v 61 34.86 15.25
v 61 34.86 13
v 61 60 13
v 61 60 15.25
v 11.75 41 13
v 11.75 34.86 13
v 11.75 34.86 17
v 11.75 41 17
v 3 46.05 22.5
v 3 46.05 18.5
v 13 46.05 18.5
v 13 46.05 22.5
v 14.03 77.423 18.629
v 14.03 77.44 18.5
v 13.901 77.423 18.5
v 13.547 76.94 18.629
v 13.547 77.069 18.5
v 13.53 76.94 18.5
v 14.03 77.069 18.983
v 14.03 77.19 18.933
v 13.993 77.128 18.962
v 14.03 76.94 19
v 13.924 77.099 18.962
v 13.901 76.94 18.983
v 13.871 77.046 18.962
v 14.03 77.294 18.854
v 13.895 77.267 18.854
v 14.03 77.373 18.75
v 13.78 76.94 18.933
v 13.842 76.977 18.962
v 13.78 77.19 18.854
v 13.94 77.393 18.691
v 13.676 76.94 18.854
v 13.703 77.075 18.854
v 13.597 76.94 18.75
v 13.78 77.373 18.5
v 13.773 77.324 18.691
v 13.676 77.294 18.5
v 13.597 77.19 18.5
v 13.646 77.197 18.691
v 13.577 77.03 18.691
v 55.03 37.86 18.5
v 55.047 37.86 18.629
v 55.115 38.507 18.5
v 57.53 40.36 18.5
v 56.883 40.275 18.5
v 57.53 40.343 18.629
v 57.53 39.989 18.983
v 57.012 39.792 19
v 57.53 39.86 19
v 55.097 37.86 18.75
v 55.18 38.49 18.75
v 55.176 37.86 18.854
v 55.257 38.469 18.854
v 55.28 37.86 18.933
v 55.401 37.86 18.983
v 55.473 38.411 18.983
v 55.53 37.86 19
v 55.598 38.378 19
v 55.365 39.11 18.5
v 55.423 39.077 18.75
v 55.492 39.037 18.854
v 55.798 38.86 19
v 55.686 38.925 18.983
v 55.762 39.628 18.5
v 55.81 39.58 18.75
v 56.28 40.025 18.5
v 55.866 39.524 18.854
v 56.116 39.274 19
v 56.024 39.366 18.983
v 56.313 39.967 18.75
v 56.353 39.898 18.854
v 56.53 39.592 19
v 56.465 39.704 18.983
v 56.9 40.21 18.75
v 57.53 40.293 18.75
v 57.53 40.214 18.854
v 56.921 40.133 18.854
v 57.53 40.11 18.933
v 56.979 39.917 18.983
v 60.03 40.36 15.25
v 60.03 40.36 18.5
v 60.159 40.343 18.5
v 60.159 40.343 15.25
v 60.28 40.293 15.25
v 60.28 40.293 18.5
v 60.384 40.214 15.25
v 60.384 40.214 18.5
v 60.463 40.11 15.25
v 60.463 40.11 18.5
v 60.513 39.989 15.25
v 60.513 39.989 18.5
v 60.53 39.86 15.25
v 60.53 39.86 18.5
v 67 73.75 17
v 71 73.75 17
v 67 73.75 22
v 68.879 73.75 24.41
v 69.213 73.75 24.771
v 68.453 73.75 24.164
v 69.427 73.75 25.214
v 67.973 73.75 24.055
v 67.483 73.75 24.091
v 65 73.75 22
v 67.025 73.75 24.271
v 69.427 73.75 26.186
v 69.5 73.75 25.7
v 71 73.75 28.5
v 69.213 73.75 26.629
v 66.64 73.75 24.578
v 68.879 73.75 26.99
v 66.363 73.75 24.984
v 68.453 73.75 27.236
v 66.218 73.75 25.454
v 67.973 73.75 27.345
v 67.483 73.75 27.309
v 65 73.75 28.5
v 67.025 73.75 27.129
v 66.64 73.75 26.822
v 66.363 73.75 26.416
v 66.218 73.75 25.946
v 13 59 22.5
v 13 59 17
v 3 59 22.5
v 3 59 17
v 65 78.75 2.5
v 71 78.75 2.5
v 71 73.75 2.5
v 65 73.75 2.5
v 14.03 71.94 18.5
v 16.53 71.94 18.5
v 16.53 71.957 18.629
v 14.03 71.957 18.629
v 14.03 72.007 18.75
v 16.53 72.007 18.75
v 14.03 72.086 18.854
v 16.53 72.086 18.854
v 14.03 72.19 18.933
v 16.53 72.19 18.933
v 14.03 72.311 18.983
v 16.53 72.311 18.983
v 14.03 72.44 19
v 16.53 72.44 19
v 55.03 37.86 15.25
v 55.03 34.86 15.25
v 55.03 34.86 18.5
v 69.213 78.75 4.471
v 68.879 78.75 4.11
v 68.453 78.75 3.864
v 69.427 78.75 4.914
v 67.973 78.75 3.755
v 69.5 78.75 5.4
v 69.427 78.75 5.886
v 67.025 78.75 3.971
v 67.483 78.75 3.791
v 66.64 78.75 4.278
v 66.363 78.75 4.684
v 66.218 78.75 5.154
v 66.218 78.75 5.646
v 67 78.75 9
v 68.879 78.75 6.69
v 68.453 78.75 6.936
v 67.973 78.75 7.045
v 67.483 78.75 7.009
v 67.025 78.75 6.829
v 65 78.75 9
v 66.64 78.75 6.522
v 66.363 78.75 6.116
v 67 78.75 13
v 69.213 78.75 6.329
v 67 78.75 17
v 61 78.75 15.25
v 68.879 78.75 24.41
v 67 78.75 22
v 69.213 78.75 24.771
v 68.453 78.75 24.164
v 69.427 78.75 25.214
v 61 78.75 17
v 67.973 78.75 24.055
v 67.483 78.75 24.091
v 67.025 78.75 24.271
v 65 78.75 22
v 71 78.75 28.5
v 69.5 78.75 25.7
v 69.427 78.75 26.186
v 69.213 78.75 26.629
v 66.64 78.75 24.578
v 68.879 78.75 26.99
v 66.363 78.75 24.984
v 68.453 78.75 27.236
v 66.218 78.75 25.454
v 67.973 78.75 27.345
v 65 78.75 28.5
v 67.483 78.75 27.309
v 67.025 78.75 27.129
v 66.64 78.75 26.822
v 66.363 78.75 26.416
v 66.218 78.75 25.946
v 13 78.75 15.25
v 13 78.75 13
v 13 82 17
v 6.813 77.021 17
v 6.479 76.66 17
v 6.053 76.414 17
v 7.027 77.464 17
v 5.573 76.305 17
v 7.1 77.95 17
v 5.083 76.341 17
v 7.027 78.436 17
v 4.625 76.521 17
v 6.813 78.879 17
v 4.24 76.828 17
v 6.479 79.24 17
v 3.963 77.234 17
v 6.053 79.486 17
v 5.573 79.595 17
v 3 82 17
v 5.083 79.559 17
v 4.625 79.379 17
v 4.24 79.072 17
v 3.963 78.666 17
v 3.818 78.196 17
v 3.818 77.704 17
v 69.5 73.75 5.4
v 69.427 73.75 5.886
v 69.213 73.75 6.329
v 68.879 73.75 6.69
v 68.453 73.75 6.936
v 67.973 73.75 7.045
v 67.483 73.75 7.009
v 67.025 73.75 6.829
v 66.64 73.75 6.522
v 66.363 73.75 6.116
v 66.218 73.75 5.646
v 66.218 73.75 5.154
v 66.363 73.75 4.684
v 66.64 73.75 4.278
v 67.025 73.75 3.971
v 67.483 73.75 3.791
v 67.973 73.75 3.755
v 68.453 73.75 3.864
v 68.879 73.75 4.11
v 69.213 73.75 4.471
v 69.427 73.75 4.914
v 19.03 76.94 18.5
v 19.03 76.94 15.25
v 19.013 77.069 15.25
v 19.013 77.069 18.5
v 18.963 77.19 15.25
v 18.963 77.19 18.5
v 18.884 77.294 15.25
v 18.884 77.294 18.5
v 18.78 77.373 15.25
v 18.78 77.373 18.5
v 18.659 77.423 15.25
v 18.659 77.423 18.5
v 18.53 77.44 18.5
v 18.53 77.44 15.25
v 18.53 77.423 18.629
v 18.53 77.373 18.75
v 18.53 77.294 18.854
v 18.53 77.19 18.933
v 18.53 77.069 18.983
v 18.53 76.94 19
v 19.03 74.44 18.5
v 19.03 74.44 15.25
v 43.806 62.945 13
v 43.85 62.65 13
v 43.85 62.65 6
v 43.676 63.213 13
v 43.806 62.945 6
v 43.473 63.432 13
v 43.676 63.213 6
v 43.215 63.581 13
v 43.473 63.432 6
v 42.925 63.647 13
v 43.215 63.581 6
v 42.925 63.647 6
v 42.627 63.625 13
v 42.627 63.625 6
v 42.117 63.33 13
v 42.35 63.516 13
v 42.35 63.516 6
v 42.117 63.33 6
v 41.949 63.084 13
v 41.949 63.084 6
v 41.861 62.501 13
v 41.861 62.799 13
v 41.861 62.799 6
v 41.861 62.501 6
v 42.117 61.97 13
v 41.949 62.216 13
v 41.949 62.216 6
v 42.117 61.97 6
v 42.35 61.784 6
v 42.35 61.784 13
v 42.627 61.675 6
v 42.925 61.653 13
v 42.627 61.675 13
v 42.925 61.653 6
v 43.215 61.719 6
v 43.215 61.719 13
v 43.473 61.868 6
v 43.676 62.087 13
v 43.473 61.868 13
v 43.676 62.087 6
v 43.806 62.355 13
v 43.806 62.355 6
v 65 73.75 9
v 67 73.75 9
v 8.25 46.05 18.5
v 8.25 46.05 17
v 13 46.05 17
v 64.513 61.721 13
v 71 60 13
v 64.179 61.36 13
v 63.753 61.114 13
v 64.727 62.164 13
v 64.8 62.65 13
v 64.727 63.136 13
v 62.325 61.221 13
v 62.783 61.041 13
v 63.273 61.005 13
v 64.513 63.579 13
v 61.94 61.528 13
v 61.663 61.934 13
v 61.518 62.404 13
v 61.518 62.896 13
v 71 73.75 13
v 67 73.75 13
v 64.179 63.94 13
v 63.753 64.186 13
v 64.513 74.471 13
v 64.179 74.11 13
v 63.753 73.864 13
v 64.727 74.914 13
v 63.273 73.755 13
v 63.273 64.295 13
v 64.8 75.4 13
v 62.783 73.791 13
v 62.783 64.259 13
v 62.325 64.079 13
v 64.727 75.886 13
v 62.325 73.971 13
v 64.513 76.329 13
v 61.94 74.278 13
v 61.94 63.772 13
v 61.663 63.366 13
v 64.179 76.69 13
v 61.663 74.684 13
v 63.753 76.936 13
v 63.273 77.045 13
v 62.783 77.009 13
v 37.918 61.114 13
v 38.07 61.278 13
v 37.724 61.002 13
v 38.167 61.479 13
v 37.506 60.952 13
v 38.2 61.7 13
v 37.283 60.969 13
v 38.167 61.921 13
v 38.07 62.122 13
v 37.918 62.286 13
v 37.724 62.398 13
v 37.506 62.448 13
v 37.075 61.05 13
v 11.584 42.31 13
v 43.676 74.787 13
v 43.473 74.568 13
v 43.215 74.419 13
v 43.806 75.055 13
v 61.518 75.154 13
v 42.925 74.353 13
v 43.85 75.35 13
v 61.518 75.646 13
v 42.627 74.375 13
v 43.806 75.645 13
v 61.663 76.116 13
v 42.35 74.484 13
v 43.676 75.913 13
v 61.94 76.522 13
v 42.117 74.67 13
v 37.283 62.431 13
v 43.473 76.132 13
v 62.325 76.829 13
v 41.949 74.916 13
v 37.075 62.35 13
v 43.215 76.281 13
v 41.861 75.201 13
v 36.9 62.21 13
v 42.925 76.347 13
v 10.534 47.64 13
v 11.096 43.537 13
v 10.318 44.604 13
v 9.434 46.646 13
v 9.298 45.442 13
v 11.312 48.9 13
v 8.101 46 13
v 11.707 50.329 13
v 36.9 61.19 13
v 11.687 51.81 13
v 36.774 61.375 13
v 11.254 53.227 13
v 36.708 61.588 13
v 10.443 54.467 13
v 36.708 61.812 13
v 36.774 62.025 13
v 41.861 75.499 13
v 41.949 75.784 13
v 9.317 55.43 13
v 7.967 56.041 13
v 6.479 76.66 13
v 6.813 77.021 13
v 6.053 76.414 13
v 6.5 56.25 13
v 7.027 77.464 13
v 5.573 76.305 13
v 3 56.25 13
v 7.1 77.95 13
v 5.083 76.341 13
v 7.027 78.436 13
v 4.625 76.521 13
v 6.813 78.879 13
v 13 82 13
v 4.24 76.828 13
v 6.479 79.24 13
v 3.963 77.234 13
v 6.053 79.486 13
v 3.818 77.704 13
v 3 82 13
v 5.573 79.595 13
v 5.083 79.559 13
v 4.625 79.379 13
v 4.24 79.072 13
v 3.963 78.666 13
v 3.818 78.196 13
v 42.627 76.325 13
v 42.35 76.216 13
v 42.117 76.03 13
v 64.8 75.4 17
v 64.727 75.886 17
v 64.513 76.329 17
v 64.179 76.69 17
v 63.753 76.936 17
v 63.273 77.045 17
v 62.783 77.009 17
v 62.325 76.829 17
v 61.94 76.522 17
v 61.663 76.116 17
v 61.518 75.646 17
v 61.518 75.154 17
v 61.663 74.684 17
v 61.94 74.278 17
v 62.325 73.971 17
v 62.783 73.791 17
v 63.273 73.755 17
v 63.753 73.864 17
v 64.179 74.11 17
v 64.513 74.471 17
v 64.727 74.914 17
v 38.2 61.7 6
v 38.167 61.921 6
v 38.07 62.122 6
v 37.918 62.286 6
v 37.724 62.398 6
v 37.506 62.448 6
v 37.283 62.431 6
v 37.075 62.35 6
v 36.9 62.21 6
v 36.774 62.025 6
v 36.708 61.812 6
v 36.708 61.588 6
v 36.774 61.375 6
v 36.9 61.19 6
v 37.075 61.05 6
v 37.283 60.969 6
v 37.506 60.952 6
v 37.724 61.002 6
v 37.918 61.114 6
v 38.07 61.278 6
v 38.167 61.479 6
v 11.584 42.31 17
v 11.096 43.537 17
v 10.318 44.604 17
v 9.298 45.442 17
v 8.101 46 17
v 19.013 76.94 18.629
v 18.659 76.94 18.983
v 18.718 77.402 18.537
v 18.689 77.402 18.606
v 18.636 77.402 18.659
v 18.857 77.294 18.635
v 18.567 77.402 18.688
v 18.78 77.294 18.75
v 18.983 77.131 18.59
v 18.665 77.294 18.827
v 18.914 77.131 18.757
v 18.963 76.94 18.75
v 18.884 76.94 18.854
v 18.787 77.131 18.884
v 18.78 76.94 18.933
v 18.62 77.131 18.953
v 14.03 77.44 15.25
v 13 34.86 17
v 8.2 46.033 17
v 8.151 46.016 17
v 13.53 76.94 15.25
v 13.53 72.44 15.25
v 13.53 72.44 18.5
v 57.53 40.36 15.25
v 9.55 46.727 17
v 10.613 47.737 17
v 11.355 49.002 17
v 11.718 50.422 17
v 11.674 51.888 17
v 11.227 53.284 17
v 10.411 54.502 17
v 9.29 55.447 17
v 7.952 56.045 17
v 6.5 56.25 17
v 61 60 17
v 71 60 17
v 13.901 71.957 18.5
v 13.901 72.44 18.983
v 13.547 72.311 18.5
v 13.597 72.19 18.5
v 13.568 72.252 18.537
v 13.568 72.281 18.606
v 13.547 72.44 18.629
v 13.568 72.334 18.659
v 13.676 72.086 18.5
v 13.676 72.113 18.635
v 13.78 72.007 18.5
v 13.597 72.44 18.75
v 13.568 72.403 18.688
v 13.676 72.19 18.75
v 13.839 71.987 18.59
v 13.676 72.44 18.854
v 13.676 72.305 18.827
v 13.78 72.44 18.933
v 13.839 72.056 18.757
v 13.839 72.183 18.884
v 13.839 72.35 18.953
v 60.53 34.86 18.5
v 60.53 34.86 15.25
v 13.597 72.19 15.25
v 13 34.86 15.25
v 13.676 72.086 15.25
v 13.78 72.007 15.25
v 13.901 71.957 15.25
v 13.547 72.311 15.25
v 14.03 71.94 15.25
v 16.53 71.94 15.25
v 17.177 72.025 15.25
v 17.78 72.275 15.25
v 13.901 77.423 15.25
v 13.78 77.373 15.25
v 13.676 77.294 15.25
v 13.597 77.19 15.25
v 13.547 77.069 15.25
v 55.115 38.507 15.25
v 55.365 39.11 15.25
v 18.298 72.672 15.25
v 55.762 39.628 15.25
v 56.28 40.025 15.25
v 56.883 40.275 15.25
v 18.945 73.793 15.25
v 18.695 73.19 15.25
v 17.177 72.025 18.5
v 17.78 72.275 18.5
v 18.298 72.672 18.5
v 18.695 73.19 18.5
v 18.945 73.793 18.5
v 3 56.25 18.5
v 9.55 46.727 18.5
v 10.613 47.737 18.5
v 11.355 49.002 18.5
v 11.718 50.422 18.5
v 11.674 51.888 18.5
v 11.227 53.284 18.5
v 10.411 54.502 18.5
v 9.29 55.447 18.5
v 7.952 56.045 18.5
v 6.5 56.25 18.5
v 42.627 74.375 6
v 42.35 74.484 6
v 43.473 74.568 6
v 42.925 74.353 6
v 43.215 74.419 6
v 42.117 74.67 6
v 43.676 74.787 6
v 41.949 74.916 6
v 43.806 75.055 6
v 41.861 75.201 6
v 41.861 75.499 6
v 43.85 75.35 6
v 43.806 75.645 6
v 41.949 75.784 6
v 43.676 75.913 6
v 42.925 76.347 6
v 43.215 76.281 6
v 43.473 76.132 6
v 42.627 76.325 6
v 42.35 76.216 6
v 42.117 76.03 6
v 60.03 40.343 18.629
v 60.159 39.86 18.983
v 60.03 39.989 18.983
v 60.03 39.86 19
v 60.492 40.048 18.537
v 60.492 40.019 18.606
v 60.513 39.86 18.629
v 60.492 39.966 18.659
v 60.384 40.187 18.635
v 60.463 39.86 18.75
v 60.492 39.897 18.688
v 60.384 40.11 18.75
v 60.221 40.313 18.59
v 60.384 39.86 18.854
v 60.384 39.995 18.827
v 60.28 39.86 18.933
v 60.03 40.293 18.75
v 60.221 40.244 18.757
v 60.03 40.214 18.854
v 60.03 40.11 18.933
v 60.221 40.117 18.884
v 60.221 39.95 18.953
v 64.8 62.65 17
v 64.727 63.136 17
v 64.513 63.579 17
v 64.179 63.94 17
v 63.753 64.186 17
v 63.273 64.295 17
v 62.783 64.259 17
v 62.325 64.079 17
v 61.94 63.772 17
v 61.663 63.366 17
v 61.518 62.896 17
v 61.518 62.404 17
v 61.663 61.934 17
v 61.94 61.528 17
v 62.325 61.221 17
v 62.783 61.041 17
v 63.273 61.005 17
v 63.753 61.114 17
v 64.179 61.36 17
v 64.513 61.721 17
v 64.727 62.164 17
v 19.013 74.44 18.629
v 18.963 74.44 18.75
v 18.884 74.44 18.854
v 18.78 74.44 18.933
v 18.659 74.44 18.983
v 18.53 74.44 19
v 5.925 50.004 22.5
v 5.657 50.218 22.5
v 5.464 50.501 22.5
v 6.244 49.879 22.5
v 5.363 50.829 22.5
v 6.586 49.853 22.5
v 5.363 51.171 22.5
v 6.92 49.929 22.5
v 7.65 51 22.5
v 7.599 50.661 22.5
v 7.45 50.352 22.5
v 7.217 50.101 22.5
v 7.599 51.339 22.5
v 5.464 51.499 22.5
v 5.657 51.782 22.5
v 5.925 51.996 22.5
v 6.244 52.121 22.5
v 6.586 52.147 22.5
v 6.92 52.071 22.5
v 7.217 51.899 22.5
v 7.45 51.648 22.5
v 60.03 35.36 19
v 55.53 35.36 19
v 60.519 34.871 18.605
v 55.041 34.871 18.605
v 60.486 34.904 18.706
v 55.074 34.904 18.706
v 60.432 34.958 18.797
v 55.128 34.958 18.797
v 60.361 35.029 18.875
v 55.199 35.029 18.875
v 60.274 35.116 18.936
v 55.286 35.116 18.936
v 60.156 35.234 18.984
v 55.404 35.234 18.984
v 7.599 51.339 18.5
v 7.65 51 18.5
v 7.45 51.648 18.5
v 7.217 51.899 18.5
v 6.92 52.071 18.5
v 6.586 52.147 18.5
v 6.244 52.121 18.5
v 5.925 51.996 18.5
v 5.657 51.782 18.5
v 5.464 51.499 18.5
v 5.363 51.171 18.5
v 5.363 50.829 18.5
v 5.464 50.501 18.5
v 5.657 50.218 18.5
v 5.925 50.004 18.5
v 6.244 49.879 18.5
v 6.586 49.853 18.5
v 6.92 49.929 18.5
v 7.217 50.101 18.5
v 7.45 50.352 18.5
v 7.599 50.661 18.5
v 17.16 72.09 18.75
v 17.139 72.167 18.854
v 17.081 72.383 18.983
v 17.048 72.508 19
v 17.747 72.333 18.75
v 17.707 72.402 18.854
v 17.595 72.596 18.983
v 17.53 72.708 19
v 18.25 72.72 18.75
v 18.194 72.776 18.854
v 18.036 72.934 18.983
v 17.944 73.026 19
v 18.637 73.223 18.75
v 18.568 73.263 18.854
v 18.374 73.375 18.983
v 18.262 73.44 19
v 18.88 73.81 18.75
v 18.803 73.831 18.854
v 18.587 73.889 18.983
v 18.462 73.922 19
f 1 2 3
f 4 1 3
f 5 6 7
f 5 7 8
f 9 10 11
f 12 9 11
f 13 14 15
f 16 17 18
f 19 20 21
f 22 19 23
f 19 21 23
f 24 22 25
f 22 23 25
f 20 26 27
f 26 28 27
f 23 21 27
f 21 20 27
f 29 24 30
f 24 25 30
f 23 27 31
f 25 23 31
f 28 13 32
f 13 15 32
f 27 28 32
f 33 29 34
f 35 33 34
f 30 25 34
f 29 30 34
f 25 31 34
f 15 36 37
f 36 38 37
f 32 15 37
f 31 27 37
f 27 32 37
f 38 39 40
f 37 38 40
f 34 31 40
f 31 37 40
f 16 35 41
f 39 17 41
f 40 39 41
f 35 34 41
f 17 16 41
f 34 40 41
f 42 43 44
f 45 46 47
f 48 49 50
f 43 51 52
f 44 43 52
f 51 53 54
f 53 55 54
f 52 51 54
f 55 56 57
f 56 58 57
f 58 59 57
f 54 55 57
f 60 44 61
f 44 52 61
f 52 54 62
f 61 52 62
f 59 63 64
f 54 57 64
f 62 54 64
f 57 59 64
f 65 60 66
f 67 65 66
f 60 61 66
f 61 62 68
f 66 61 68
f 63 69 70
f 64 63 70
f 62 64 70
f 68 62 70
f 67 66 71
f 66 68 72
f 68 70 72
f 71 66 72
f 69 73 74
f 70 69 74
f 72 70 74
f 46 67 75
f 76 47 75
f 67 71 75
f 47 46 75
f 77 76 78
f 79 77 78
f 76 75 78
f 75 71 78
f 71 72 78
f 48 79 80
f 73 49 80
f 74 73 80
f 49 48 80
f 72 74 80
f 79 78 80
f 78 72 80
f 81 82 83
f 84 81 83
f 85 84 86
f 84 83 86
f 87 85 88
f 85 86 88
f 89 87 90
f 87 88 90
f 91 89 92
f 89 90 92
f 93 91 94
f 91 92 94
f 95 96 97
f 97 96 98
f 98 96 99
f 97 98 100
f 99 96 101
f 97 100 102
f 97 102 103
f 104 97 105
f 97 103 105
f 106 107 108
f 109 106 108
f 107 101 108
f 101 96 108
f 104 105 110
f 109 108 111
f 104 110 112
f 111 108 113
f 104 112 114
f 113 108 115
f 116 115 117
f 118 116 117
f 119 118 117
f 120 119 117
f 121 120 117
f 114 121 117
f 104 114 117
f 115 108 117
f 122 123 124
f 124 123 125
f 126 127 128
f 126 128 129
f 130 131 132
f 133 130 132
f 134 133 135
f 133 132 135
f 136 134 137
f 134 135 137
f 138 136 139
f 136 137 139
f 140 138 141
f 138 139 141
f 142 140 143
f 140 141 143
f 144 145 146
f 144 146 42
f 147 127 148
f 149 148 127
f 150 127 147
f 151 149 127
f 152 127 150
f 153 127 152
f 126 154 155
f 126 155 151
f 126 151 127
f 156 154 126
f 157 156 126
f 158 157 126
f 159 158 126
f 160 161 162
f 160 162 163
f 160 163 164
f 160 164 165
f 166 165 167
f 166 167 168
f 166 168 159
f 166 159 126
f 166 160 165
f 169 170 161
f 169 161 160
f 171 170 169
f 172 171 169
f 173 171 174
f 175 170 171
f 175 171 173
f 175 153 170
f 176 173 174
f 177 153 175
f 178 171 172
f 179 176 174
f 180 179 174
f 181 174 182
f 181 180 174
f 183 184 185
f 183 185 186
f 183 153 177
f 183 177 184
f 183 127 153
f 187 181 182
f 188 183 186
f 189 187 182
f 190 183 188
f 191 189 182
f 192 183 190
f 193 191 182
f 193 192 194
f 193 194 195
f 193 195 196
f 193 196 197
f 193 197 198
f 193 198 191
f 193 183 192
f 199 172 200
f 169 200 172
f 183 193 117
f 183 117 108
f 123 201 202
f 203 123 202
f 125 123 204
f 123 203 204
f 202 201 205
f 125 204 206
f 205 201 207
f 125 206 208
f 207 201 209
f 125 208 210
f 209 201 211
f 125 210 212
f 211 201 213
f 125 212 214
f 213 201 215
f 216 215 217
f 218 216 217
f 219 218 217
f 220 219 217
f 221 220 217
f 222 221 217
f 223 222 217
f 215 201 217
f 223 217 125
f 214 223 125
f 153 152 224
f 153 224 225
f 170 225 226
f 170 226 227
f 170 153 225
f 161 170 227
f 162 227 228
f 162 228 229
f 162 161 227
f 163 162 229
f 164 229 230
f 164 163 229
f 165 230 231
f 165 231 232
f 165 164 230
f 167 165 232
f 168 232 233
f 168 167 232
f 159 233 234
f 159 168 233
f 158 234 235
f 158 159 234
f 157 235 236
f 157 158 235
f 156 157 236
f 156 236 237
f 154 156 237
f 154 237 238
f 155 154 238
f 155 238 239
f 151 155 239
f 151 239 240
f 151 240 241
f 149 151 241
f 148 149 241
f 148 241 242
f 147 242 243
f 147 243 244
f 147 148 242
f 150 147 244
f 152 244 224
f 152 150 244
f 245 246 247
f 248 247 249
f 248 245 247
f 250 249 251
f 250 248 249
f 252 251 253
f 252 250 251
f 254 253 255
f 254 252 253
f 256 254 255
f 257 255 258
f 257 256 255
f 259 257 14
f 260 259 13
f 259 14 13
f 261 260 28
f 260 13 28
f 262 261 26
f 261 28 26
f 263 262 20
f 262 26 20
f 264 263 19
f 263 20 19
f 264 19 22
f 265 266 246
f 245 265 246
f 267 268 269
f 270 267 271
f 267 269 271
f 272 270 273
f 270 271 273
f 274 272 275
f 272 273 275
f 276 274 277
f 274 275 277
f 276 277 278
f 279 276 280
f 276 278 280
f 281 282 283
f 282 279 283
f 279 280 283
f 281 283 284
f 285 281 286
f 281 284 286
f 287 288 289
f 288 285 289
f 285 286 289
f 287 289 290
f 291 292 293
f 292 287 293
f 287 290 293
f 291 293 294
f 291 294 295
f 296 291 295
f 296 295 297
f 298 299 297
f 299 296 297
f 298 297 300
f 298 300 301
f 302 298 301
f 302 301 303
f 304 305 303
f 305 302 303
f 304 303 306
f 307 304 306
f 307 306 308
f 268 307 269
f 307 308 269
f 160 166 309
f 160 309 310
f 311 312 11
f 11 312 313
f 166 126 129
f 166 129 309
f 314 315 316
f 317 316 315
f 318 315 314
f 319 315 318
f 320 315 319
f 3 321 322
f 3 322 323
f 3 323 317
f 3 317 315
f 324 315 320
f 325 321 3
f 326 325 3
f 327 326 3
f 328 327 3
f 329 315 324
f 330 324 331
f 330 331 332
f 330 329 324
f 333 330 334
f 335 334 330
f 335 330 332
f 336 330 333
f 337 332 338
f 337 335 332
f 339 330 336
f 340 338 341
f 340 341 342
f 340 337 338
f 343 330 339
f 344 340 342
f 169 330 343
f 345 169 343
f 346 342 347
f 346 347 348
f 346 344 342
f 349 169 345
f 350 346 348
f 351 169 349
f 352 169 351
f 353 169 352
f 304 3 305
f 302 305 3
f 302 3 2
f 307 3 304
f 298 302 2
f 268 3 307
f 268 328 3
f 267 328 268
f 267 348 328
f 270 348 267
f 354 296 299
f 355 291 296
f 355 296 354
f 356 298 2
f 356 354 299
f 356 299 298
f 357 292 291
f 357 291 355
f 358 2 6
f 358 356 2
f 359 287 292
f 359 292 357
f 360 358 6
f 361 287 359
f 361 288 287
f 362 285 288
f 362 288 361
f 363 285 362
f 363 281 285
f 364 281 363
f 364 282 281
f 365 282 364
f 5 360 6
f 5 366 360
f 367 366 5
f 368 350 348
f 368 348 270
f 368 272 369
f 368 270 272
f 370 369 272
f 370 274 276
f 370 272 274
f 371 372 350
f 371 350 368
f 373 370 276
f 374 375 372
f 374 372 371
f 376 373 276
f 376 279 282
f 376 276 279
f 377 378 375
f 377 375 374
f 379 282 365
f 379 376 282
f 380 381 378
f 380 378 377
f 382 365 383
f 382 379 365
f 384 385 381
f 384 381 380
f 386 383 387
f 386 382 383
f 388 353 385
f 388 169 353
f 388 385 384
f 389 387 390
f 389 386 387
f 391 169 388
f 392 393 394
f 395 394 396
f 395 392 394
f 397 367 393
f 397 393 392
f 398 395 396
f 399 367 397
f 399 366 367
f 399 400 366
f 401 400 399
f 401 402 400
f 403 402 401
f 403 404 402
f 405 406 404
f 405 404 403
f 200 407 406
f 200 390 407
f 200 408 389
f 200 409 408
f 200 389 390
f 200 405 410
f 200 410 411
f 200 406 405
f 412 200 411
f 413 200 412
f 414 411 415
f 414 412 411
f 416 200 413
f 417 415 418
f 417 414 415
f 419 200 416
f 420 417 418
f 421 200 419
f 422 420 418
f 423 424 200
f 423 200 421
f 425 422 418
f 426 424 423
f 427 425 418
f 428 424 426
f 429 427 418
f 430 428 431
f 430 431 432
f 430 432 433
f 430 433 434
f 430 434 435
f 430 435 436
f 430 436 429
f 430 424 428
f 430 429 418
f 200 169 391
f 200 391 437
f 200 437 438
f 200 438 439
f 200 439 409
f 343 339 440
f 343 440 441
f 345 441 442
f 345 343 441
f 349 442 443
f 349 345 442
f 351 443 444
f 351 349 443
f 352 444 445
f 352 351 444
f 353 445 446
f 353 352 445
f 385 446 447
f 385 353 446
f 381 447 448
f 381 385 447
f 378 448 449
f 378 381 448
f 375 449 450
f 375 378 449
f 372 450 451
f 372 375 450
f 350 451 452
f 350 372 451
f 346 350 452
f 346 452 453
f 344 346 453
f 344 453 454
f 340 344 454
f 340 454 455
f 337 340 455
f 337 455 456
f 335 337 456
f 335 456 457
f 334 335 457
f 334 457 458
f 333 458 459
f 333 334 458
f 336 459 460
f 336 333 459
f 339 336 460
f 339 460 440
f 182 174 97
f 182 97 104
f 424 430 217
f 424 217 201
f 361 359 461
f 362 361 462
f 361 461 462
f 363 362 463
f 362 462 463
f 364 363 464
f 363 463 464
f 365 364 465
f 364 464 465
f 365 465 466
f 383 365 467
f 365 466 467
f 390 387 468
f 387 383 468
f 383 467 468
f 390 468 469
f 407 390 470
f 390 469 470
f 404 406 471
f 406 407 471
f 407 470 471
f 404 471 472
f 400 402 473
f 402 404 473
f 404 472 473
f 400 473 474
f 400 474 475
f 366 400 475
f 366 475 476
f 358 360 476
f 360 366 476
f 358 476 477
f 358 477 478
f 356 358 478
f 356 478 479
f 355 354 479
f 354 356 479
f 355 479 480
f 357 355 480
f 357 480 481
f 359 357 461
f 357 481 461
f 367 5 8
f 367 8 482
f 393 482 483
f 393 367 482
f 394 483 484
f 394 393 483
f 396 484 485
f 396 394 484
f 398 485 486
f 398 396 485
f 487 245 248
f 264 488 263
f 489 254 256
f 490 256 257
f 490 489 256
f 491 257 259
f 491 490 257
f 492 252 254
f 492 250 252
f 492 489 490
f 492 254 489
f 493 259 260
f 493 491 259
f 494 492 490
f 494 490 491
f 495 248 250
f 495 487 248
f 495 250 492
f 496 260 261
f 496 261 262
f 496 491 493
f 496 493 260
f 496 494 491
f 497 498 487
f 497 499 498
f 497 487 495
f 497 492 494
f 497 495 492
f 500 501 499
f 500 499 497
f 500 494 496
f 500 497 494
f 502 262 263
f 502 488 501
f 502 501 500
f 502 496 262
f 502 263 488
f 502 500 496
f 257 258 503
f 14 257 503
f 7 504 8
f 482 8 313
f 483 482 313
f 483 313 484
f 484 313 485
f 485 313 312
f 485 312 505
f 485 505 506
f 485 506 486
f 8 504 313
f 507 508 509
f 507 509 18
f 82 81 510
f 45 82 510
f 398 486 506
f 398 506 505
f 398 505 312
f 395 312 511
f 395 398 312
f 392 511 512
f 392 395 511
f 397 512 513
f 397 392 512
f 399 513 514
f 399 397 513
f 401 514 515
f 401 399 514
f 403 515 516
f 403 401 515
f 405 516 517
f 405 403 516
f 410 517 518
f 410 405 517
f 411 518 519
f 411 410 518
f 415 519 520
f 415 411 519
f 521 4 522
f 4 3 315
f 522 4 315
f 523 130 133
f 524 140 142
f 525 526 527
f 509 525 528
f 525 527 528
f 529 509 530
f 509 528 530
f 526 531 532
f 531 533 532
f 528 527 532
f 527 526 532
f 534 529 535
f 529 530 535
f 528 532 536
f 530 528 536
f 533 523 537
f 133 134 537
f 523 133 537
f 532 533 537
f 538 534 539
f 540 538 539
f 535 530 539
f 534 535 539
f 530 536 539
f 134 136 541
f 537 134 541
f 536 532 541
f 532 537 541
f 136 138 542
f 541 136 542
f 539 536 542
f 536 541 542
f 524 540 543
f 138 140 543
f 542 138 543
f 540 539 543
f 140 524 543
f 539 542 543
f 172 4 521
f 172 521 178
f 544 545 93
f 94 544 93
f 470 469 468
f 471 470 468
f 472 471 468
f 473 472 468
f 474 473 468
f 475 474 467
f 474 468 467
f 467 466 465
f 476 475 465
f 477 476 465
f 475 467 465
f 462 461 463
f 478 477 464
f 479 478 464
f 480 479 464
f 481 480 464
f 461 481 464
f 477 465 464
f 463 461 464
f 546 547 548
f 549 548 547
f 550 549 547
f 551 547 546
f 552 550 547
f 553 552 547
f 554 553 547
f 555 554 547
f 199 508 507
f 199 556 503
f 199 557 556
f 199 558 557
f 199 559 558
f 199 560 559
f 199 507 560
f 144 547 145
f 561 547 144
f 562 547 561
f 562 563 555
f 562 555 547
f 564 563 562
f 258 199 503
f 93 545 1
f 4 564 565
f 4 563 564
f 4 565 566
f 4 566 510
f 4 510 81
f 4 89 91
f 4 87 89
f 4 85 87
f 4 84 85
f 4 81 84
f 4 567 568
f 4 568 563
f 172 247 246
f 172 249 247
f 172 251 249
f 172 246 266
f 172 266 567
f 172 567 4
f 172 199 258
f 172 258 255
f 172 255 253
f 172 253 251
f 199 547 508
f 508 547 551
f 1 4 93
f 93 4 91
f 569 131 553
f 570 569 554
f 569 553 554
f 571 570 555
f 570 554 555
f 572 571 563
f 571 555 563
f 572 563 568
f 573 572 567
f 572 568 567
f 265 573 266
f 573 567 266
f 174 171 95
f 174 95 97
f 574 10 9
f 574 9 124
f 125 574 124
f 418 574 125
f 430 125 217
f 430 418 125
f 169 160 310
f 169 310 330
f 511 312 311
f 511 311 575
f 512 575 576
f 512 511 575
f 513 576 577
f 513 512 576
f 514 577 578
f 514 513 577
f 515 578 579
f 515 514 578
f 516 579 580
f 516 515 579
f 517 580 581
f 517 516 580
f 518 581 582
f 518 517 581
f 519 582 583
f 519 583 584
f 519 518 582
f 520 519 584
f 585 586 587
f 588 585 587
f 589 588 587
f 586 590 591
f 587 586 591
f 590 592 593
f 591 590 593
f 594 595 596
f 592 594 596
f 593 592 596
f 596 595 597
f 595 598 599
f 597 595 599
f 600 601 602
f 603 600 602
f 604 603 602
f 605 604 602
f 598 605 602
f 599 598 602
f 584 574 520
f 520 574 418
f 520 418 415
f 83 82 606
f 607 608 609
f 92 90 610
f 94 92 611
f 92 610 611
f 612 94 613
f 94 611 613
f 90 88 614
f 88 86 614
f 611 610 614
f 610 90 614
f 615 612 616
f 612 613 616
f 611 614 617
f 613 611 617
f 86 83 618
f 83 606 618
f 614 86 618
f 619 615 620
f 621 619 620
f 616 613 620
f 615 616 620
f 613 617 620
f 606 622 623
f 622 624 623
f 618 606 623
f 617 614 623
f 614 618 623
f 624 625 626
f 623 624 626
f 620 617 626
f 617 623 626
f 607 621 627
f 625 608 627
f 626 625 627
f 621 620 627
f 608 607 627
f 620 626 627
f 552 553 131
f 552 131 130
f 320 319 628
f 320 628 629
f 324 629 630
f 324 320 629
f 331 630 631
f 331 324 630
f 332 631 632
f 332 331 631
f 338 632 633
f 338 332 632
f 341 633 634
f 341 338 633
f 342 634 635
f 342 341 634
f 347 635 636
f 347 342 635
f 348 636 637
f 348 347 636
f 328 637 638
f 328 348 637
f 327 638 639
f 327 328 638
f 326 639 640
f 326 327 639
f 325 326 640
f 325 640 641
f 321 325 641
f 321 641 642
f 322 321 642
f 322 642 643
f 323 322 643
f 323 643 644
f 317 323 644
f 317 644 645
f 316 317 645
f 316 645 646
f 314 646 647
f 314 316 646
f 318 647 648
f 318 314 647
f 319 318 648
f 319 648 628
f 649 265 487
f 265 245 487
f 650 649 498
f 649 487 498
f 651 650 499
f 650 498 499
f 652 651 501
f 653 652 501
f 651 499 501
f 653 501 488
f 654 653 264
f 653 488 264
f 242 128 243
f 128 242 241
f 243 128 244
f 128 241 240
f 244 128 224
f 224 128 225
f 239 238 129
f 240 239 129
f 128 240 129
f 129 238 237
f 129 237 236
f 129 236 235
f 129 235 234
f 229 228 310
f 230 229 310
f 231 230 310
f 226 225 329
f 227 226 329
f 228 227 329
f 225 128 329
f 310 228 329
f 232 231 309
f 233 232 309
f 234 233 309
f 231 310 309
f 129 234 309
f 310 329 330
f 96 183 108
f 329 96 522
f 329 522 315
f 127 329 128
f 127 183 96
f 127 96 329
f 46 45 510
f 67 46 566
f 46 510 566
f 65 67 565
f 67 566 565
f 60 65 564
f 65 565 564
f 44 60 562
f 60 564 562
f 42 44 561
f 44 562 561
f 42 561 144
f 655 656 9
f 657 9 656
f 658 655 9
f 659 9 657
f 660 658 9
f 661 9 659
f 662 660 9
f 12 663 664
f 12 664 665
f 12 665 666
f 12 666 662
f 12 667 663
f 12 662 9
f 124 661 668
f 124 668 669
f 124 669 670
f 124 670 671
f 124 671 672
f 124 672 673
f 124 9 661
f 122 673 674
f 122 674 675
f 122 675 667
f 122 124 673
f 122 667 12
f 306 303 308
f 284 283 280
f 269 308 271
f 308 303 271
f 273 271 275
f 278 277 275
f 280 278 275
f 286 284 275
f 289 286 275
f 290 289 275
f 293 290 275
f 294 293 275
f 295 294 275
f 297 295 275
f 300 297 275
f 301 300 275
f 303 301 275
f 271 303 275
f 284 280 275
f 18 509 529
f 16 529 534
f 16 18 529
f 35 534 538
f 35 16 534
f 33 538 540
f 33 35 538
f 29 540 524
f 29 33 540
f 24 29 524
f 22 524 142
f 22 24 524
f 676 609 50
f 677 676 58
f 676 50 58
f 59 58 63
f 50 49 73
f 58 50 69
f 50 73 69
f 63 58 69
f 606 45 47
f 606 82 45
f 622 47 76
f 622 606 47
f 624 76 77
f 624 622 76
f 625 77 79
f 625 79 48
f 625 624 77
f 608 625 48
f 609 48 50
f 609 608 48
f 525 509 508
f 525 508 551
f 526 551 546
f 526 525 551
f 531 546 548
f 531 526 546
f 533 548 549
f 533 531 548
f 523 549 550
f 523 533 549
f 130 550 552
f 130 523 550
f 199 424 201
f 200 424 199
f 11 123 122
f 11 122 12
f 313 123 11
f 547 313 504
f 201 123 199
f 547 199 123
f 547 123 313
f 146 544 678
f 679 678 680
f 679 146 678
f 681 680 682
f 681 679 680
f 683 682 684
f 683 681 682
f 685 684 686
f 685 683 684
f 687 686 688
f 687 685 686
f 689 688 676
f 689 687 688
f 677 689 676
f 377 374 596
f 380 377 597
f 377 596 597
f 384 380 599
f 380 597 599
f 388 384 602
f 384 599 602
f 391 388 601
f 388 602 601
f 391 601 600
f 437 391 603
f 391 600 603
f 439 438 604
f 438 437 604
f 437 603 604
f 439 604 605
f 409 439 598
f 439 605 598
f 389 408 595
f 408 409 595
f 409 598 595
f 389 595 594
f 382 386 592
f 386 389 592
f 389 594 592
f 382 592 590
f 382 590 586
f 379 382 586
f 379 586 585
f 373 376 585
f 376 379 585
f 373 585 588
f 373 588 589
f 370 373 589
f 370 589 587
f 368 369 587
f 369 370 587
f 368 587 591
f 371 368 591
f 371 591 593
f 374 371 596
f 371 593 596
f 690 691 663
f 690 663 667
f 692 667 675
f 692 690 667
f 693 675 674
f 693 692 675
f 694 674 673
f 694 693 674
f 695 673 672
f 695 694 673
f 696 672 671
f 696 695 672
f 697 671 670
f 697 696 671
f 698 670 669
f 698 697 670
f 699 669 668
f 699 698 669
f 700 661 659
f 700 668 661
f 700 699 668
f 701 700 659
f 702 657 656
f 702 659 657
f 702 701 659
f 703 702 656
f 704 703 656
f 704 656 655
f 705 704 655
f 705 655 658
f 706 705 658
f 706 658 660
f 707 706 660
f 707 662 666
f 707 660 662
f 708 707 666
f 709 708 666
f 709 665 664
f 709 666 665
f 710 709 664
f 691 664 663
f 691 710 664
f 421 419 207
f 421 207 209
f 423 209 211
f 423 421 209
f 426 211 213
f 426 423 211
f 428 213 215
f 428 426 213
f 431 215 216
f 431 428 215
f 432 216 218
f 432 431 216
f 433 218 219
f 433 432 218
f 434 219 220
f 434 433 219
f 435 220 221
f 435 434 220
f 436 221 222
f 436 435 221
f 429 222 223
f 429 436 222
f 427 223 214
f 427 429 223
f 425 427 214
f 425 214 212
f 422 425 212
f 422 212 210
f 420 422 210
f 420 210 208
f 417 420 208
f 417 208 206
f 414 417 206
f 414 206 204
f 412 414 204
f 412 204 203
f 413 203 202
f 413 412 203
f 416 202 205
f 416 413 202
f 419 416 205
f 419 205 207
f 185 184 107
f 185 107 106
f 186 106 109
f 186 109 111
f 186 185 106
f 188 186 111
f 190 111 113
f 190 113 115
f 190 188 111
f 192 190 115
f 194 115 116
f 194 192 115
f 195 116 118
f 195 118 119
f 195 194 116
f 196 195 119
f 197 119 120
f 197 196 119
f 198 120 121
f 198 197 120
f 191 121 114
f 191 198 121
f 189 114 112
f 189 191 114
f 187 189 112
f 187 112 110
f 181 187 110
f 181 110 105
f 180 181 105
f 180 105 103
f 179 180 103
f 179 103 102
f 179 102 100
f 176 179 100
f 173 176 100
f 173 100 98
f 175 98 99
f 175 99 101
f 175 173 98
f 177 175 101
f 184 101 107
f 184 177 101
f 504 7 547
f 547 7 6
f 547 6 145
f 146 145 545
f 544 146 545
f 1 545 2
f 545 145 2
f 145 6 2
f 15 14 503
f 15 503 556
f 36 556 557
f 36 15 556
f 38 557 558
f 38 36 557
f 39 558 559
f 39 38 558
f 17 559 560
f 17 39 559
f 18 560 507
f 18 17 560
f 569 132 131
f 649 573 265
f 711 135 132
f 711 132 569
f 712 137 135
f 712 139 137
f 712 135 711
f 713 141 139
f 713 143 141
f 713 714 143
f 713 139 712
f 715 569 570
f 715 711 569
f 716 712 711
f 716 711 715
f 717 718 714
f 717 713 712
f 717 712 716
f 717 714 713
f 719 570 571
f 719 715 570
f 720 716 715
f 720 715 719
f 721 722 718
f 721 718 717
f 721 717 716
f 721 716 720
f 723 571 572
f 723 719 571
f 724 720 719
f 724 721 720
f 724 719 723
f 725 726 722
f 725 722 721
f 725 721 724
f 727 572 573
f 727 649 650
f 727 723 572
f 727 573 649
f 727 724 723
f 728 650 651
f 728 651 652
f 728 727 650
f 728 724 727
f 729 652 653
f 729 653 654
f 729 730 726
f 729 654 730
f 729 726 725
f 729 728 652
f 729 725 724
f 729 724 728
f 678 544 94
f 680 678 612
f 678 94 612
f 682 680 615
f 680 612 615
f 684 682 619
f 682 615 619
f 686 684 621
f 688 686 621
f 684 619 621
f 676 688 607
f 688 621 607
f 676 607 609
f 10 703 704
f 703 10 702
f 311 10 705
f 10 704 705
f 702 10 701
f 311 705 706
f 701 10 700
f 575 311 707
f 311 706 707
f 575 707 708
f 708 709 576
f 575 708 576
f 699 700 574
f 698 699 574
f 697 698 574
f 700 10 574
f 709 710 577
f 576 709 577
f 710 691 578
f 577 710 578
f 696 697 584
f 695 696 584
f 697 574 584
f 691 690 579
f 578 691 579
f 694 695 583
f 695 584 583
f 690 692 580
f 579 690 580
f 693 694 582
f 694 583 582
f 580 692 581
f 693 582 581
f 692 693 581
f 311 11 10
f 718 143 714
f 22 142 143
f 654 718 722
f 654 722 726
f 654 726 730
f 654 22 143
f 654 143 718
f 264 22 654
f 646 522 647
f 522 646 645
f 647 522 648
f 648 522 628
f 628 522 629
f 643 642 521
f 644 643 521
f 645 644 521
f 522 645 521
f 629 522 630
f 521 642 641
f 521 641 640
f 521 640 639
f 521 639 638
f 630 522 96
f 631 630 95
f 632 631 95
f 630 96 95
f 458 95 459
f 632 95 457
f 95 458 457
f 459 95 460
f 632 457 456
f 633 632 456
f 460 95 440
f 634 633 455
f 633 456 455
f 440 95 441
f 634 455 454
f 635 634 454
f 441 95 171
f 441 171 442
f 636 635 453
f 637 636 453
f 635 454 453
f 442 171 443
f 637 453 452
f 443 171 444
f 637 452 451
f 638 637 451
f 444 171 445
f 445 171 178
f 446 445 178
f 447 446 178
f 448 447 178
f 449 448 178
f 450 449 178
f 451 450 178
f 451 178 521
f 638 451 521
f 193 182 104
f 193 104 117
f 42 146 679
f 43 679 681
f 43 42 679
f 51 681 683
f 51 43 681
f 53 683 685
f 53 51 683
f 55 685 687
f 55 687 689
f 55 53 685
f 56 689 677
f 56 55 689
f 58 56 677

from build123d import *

# Parameters (mm, degrees)
CYLINDER022_R     = 1.15
CYLINDER022_DEPTH = 10
EXTRUDE025_DEPTH  = 1.5
SKETCH022_R       = 0.75
SKETCH022_R_2     = 1
EXTRUDE022_DEPTH  = 8
BOX005_W          = 48
BOX005_H          = 45
BOX005_DEPTH      = 10
SKETCH020_R       = 1.65
EXTRUDE020_DEPTH  = 4
EXTRUDE001_DEPTH  = 4
FILLET003_R       = 0.5
SKETCH021_R       = 1.65
EXTRUDE021_DEPTH  = 5
BOX006_W          = 10
BOX006_H          = 12.95
BOX006_DEPTH      = 4


with BuildPart() as cylinder022:
    # Cylinder022 → Cylinder022 (new body)
    with BuildSketch(Plane(origin=(6.5, 51, 13.03), x_dir=(1, 0, 0), z_dir=(0, 0, 1))):
        Circle(CYLINDER022_R)
    extrude(amount=CYLINDER022_DEPTH)


with BuildPart() as extrude025:
    # Sketch028 → Extrude025 (new body)
    with BuildSketch(Plane.XY):
        with BuildLine():
            Line((8.25, 46.050253), (13, 46.050253))
            Line((13, 46.050253), (13, 59))
            Line((13, 59), (3, 59))
            Line((3, 59), (3, 56.25))
            Line((3, 56.25), (6.5, 56.25))
            ThreePointArc((8.25, 46.050253), (11.674392, 51.887785), (6.5, 56.25))
        make_face()
    extrude(amount=EXTRUDE025_DEPTH)


with BuildPart() as extrude025_1:
    # Extrude025 placement: moved
    add(extrude025.part.moved(Location((0, 0, 17))))


with BuildPart() as extrude022:
    # Sketch022 → Extrude022 (new body)
    with BuildSketch(Plane.XY):
        with Locations((37.45, 61.7)):
            Circle(SKETCH022_R)
        with Locations((42.85, 62.65)):
            Circle(SKETCH022_R_2)
        with Locations((42.85, 75.35)):
            Circle(SKETCH022_R_2)
    extrude(amount=EXTRUDE022_DEPTH)


with BuildPart() as extrude022_1:
    # Extrude022 placement: moved
    add(extrude022.part.moved(Location((0, 0, 6))))


with BuildPart() as sensorholdipscut:
    # Box005 → Box005 (new body)
    with BuildSketch(Plane(origin=(13, 34, 15.25), x_dir=(1, 0, 0), z_dir=(0, 0, 1))):
        with Locations((24, 22.5)):
            Rectangle(BOX005_W, BOX005_H)
    extrude(amount=BOX005_DEPTH)


with BuildPart() as sensorhold:
    # Sketch020 → Extrude020 (new body)
    with BuildSketch(Plane.XY):
        with BuildLine():
            Line((3, 56.25), (3, 82))
            Line((3, 82), (13, 82))
            Line((13, 82), (13, 78.75))
            Line((13, 78.75), (71, 78.75))
            Line((71, 78.75), (71, 60))
            Line((61, 60), (71, 60))
            Line((61, 34.86), (61, 60))
            Line((11.75, 34.86), (61, 34.86))
            Line((11.75, 34.86), (11.75, 41))
            ThreePointArc((11.75, 41), (10.740672, 44.095028), (8.100781, 46))
            ThreePointArc((8.100781, 46), (11.687123, 51.810093), (6.5, 56.25))
            Line((3, 56.25), (6.5, 56.25))
        make_face()
        with Locations((5.45, 77.95)):
            Circle(SKETCH020_R, mode=Mode.SUBTRACT)
        with Locations((63.15, 62.65)):
            Circle(SKETCH020_R, mode=Mode.SUBTRACT)
        with Locations((63.15, 75.4)):
            Circle(SKETCH020_R, mode=Mode.SUBTRACT)
    extrude(amount=EXTRUDE020_DEPTH)


with BuildPart() as sensorhold_1:
    # Extrude020 placement: moved
    add(sensorhold.part.moved(Location((0, 0, 13))))

    # Cut007: cut sensorHoldIPSCut
    add(sensorholdipscut.part, mode=Mode.SUBTRACT)


with BuildPart() as ipsholdbottomindone:
    # Sketch001 → Extrude001 (new body)
    with BuildSketch(Plane.XY):
        with BuildLine():
            Line((19.03, 74.44), (19.03, 77.44))
            Line((19.03, 77.44), (13.53, 77.44))
            Line((13.53, 71.94), (13.53, 77.44))
            Line((16.53, 71.94), (13.53, 71.94))
            ThreePointArc((16.53, 71.94), (18.297767, 72.672233), (19.03, 74.44))
        make_face()
        with BuildLine():
            Line((60.53, 34.86), (55.03, 34.86))
            Line((55.03, 34.86), (55.03, 37.86))
            ThreePointArc((57.53, 40.36), (55.762233, 39.627767), (55.03, 37.86))
            Line((60.53, 40.36), (57.53, 40.36))
            Line((60.53, 34.86), (60.53, 40.36))
        make_face()
    extrude(amount=EXTRUDE001_DEPTH)


with BuildPart() as ipsholdbottomindone_1:
    # Extrude001 placement: moved
    add(ipsholdbottomindone.part.moved(Location((0, 0, 2))))

    # Fillet003
    fillet003_edges = [ipsholdbottomindone_1.edges().sort_by_distance(p)[0] for p in [
        (57.78, 34.86, 6),
        (55.03, 36.36, 6),
        (55.762233, 39.627767, 6),
        (60.53, 40.36, 4),
        (59.03, 40.36, 6),
        (60.53, 37.61, 6),
        (18.297767, 72.672233, 6),
        (19.03, 77.44, 4),
        (19.03, 75.94, 6),
        (13.53, 77.44, 4),
        (16.28, 77.44, 6),
        (13.53, 71.94, 4),
        (13.53, 74.69, 6),
        (15.03, 71.94, 6),
    ]]
    fillet(fillet003_edges, radius=FILLET003_R)


with BuildPart() as ipsholdbottomindone_2:
    # Fillet003 placement: moved
    add(ipsholdbottomindone_1.part.moved(Location((0, 0, 13))))


with BuildPart() as gpshold:
    # Sketch021 → Extrude021 (new body)
    with BuildSketch(Plane.XZ):
        Polygon((65, 28.5), (71, 28.5), (71, 2.5), (65, 2.5), (65, 9), (67, 9), (67, 22), (65, 22), align=None)
        with Locations((67.85, 25.7)):
            Circle(SKETCH021_R, mode=Mode.SUBTRACT)
        with Locations((67.85, 5.4)):
            Circle(SKETCH021_R, mode=Mode.SUBTRACT)
    extrude(amount=EXTRUDE021_DEPTH)


with BuildPart() as gpshold_1:
    # Extrude021 placement: moved
    add(gpshold.part.moved(Location((0, 78.75, 0))))


with BuildPart() as sensorhold003:
    # Box006 → Box006 (new body)
    with BuildSketch(Plane(origin=(3, 46.05, 18.5), x_dir=(1, 0, 0), z_dir=(0, 0, 1))):
        with Locations((5, 6.475)):
            Rectangle(BOX006_W, BOX006_H)
    extrude(amount=BOX006_DEPTH)

    # Fusion025: union Extrude025, Extrude022, SensorHold, ipsHoldBottomInDone, gpsHold
    add(extrude025_1.part)
    add(extrude022_1.part)
    add(sensorhold_1.part)
    add(ipsholdbottomindone_2.part)
    add(gpshold_1.part)

    # Cut008: cut Cylinder022
    add(cylinder022.part, mode=Mode.SUBTRACT)


solid = sensorhold003.part
